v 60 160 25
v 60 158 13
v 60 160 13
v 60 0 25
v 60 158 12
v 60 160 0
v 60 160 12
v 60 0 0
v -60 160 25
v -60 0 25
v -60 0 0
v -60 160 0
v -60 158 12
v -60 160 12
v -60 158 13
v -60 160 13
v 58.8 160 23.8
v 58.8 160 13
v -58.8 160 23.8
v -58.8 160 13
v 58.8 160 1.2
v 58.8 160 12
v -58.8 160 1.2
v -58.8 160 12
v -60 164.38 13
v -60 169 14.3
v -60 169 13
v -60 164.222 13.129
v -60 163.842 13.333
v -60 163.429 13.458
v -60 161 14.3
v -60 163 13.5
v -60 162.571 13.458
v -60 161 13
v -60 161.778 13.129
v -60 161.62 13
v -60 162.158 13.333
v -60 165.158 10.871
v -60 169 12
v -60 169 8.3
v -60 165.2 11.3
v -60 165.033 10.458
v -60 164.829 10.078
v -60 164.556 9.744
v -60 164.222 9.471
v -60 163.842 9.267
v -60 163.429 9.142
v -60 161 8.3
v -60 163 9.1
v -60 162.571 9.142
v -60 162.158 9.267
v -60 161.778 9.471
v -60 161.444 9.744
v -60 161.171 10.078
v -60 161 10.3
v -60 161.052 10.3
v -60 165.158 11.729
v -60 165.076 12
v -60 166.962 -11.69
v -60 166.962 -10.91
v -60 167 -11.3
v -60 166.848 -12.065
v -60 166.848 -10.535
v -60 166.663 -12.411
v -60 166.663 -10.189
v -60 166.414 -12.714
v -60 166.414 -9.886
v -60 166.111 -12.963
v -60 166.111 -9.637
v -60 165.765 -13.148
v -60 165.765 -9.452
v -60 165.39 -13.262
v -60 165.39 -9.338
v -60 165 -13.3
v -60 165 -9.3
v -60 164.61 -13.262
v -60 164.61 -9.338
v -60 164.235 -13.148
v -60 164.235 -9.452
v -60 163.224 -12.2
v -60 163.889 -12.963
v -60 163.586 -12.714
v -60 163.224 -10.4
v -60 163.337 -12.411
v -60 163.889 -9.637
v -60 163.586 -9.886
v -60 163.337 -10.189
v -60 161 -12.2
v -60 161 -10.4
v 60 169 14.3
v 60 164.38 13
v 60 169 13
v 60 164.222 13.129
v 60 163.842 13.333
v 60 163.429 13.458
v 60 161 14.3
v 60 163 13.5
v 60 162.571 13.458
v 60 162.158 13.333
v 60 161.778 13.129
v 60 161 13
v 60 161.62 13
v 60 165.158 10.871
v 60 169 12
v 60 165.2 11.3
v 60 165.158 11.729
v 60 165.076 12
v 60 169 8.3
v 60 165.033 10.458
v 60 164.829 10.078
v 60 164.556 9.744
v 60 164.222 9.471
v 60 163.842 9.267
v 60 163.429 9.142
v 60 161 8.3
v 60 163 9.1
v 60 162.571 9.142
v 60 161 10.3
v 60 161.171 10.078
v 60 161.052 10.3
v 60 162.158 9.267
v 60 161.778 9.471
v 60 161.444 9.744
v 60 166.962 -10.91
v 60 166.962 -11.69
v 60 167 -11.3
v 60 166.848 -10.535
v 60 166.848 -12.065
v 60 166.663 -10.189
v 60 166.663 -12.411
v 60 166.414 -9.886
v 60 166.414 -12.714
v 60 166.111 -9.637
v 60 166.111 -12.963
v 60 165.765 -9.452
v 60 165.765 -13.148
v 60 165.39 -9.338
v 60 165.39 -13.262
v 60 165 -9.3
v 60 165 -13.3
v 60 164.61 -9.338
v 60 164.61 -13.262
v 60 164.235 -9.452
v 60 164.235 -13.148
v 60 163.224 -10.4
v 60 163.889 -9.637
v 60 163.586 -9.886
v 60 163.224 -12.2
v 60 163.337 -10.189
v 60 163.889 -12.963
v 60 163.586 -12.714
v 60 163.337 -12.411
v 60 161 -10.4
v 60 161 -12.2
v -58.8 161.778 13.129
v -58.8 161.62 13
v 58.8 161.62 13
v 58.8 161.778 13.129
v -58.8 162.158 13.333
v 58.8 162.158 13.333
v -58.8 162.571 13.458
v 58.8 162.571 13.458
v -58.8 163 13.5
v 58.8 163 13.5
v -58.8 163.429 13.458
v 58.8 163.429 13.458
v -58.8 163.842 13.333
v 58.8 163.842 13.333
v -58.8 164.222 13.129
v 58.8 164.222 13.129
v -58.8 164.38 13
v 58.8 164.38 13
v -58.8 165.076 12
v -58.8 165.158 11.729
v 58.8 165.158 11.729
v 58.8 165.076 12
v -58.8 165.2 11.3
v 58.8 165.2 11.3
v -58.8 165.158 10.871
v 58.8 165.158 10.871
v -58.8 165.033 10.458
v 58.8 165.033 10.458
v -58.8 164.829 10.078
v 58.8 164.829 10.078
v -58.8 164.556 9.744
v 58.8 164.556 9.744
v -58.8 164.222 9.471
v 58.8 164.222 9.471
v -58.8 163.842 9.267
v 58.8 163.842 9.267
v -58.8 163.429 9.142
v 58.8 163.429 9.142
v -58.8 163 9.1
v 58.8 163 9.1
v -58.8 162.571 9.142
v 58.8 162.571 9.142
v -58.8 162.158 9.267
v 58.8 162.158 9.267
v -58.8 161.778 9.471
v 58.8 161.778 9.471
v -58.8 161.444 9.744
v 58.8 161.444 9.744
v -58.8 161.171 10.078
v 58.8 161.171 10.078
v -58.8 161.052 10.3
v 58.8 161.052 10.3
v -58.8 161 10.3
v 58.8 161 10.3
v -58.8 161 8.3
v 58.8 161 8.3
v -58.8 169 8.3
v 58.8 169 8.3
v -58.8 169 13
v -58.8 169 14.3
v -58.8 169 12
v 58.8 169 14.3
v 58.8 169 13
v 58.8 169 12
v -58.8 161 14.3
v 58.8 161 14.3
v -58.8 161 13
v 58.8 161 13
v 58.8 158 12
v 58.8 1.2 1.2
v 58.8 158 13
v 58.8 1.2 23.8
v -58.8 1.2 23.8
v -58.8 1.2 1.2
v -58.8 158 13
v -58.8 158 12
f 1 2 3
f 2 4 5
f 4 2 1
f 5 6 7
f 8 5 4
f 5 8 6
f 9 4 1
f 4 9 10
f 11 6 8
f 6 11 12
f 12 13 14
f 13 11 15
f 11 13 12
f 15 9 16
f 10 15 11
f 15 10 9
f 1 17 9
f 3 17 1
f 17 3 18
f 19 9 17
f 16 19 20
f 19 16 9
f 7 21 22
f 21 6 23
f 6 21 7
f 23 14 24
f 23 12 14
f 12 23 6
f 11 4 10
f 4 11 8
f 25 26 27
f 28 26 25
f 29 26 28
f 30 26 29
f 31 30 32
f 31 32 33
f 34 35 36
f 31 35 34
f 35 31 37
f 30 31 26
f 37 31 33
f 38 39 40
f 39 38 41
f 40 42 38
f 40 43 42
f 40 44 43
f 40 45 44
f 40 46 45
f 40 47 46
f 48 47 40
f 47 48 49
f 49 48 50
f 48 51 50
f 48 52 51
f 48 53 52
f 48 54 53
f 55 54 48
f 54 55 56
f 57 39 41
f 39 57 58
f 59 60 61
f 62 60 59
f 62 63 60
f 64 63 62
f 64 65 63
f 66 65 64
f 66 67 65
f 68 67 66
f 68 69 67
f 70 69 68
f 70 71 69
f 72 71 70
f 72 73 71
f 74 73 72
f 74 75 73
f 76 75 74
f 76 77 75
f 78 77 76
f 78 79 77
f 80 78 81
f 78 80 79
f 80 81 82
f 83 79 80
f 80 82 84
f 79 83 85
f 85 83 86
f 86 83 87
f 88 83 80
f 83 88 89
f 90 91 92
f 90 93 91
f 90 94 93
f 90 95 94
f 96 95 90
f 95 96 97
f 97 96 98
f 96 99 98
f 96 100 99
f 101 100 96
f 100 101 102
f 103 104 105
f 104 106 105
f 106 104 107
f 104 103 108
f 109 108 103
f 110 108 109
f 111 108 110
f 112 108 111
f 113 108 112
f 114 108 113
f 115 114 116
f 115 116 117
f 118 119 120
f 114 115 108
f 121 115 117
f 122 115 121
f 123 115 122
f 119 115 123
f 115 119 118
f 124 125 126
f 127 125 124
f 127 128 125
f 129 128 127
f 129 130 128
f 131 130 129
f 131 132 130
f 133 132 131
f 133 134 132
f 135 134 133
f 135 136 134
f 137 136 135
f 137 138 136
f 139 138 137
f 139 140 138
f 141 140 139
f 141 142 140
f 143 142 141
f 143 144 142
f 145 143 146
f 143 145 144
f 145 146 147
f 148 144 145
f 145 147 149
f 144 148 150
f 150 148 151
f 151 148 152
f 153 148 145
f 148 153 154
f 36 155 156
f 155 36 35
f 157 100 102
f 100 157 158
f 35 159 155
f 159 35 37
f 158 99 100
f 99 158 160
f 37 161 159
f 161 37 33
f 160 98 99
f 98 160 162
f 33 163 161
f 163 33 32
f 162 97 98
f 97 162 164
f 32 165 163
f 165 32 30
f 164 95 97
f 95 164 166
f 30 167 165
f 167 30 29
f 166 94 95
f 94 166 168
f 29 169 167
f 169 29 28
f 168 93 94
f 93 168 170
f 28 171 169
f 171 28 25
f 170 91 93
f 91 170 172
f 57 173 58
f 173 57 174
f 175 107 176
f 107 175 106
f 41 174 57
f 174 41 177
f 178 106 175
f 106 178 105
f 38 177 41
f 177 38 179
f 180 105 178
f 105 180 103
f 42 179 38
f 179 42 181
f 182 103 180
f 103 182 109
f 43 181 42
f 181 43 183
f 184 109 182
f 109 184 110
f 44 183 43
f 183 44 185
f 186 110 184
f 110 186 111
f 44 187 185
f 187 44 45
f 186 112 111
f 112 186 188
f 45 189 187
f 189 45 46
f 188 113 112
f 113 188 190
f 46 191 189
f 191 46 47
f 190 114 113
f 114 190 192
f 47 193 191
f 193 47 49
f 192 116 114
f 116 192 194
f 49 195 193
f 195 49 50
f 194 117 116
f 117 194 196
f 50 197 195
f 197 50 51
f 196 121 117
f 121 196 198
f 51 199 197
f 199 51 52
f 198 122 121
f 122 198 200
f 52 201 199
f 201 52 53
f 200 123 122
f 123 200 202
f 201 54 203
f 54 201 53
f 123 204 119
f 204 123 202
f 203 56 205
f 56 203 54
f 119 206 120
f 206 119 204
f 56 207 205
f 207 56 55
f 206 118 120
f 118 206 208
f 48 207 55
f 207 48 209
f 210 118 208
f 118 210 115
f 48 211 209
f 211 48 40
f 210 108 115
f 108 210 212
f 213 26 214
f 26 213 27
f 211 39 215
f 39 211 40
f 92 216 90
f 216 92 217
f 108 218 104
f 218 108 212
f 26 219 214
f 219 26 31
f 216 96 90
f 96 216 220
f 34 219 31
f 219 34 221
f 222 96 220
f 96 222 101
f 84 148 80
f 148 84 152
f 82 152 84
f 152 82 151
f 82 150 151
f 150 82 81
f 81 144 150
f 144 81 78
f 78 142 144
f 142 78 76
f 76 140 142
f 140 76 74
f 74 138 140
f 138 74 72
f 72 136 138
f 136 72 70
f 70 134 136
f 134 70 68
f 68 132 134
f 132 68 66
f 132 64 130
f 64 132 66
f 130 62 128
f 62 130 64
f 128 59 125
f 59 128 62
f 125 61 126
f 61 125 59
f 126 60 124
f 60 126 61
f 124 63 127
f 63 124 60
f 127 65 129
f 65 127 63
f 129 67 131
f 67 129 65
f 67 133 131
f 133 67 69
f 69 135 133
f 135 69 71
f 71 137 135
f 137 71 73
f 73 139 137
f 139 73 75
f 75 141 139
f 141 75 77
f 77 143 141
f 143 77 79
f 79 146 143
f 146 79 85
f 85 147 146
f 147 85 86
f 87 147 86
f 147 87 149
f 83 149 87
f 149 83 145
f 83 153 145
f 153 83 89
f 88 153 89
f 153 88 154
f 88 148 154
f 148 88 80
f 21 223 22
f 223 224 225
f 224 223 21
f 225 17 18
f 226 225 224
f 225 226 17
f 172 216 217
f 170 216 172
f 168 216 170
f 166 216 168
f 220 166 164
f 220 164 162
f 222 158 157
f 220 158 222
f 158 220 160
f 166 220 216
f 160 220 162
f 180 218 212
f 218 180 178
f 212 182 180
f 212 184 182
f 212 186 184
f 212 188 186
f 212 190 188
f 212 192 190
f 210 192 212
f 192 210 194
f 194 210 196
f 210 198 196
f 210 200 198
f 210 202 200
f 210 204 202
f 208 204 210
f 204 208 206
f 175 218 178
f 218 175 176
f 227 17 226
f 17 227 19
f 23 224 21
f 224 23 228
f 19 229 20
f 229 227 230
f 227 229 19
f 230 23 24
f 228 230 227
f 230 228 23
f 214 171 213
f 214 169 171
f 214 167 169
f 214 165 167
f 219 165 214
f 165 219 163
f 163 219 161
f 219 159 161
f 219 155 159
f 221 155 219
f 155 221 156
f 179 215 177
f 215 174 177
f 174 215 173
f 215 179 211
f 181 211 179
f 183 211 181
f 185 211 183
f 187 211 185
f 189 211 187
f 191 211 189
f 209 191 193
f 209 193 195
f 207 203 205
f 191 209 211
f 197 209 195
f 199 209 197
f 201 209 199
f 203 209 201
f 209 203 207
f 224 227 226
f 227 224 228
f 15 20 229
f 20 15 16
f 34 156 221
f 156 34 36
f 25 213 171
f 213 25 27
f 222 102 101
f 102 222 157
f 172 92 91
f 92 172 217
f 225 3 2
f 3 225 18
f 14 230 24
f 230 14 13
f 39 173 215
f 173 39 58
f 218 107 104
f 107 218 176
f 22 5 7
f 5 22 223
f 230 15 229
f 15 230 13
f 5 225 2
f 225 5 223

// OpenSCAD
/*
 * REVOLUTIONARY TECHNOLOGY: ESD-SAFE TPU ZIPPER POUCH
 * Material Requirement: Carbon-Nanotube Infused ESD-TPU (Flexible)
 * Surface Resistance Target: 10^6 to 10^9 Ohms
 */

// Parametric Dimensions to fit the RT Motherboard / Snap Circuits
bag_width = 120;
bag_height = 160;
bag_depth = 25;
wall_thickness = 1.2; // 3 perimeters for flexible TPU

// Zipper Mechanism Variables
zip_radius = 2.0;
zip_offset = 1.5;

module esd_zipper_pouch() {
    difference() {
        union() {
            // Main Pouch Body
            translate([-bag_width/2, 0, 0])
                cube([bag_width, bag_height, bag_depth]);
            
            // Top Zipper Assembly (Male / Female Interlocking Rails)
            translate([-bag_width/2, bag_height, 0])
                zipper_rails();
        }
        
        // Hollow out the pouch (leaving the thin flexible walls)
        translate([-(bag_width/2) + wall_thickness, wall_thickness, wall_thickness])
            cube([bag_width - (wall_thickness*2), bag_height + 10, bag_depth - (wall_thickness*2)]);
            
        // Cut the top open so the bag can actually part
        translate([-bag_width/2 - 1, bag_height - 2, bag_depth/2 - 0.5])
            cube([bag_width + 2, 15, 1]);
    }
}

module zipper_rails() {
    // Extrude the mechanical interference profiles across the top of the bag
    rotate([0, 90, 0])
    linear_extrude(height = bag_width) {
        
        // --- FEMALE RECEIVING TRACK ---
        translate([-bag_depth/2 + wall_thickness, 5]) {
            difference() {
                // Outer structural clamp
                square([6, 8], center=true);
                // Inner hollow for the male arrow to snap into
                translate([0, -2])
                    circle(r=zip_radius + 0.2, $fn=32);
                // The gap for the male stalk
                translate([0, -5])
                    square([zip_radius, 6], center=true);
            }
        }
        
        // --- MALE INTERLOCKING ARROW ---
        translate([bag_depth/2 - wall_thickness, 5]) {
            union() {
                // The stalk
                translate([0, -2])
                    square([zip_radius - 0.2, 4], center=true);
                // The locking bulb
                circle(r=zip_radius, $fn=32);
            }
        }
    }
}

// Render the ESD Pouch
color("DarkSlateGray") // ESD Carbon materials are natively matte black/gray
esd_zipper_pouch();
